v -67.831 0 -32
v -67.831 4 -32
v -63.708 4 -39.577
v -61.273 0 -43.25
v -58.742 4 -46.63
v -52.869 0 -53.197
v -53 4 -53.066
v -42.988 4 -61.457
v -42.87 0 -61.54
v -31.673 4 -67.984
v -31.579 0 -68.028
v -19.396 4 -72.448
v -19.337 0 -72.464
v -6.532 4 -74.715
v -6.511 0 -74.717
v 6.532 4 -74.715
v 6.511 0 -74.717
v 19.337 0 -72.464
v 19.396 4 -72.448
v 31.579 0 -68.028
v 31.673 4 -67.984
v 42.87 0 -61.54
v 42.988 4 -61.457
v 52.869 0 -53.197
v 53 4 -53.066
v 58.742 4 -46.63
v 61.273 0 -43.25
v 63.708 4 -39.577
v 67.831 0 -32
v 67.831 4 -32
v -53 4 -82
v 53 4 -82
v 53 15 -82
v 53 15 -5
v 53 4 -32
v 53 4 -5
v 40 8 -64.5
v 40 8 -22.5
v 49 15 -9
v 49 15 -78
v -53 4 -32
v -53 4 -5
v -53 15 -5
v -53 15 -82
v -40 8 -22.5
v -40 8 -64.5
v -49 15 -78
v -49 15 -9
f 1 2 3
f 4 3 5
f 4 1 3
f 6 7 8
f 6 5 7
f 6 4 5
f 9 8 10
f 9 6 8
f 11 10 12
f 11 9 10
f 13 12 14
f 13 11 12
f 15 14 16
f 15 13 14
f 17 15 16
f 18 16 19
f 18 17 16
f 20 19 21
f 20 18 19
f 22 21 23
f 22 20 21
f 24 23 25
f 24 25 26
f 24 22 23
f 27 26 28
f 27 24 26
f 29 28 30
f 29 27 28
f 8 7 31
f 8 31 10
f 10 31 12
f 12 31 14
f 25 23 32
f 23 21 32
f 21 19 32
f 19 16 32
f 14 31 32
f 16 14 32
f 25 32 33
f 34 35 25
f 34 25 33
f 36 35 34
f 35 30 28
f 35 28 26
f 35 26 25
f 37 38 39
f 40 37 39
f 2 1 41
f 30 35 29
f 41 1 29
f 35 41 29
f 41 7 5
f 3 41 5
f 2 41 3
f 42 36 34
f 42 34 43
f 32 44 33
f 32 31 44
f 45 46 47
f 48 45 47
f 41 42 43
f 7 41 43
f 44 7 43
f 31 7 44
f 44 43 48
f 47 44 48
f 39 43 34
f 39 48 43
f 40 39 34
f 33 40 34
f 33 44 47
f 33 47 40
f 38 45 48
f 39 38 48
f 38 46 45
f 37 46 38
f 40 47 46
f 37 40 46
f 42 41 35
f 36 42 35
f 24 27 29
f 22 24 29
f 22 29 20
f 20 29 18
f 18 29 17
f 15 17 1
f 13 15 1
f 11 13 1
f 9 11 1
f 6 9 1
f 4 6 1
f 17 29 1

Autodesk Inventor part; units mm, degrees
ref_plane "YZ Plane" through (0, 0, 0) normal (1, 0, 0) x (0, 1, 0)
ref_plane "XZ Plane" through (0, 0, 0) normal (0, 1, 0) x (-1, 0, 0)
ref_plane "XY Plane" through (0, 0, 0) normal (0, 0, 1) x (1, 0, 0)
sketch "Boceto1" plane through (0, 0, 0) normal (0, 1, 0) x (-1, 0, 0)
  arc A0 (-67.8307, -32) -> (67.8307, -32) centre (0, 0) ccw
  line L0 (0, -32) -> (-67.8307, -32)
  line L1 (0, -32) -> (67.8307, -32)
  dimension "d0" = 150
extrude "Extrusión1" add sketch "Boceto1" along normal blind 4
sketch "Boceto2" plane through (0, 4, 0) normal (0, 1, 0) x (1, 0, 0)
  line L0 (-67.8307, 32) -> (67.8307, 32) projected
  line L1 (0, 32) -> (0, 5)
  line L2 (0, 5) -> (-53, 5)
  line L3 (-53, 5) -> (-53, 82)
  line L4 (-53, 82) -> (53, 82)
  line L5 (53, 82) -> (53, 5)
  line L6 (53, 5) -> (0, 5)
  point P0 (0, 0)
  dimension "d4" = 27
  dimension "d5" = 53
  dimension "d6" = 77
  dimension "d7" = 106
extrude "Extrusión2" add sketch "Boceto2" along normal blind 11
sketch "Boceto3" plane through (0, 15, 0) normal (0, 1, 0) x (1, 0, 0)
  line L0 (53, 5) -> (53, 82) projected
  line L1 (53, 43.5) -> (53, 64.5)
  line L2 (40, 64.5) -> (-40, 64.5)
  line L3 (-53, 82) -> (-53, 5) projected
  line L4 (53, 82) -> (-53, 82) projected
  line L5 (0, 82) -> (40, 82)
  line L6 (40, 64.5) -> (40, 22.5)
  line L7 (-53, 5) -> (53, 5) projected
  line L8 (0, 82) -> (-40, 82)
  line L9 (-40, 64.5) -> (-40, 22.5)
  line L10 (53, 43.5) -> (53, 22.5)
  line L11 (40, 22.5) -> (-40, 22.5)
  point P0 (0, 0)
  dimension "d10" = 21
  dimension "d11" = 40
  dimension "d12" = 40
  dimension "d13" = 21
extrude "Extrusión3" cut sketch "Boceto3" against normal blind 7 contours L6 L11 L9 L2
sketch "Boceto4" plane through (40, 15, -22.5) normal (0, 0, -1) x (-1, 0, 0)
  line L0 (80, 0) -> (80, -7) projected
  line L1 (0, 0) -> (0, -7) projected
  line L2 (80, -7) -> (0, -7)
  line L3 (-13, 0) -> (-9, 0)
  line L4 (-9, 0) -> (0, 0)
  line L5 (0, 0) -> (0, -7)
  line L6 (0, -7) -> (-9, 0)
  line L7 (93, 0) -> (89, 0)
  line L8 (89, 0) -> (80, 0)
  line L9 (80, -7) -> (89, 0)
  point P0 (40, -15)
  dimension "d16" = 4
  dimension "d17" = 4
extrude "Extrusión4" cut sketch "Boceto4" along normal blind 55.5 and the other way blind 13.5
sketch "Boceto5" plane through (40, 8, -64.5) normal (1, 0, 0) x (0, 0, -1)
  line L0 (0, 7) -> (0, 0) projected
  line L1 (0, 0) -> (0, 7)
  line L2 (13.5, 7) -> (13.5, 0) projected
  line L3 (0, 7) -> (13.5, 7)
  line L4 (0, 0) -> (13.5, 0) projected
  line L5 (13.5, 7) -> (0, 0)
  line L6 (0, 0) -> (0, 7)
  line L7 (-42, 0) -> (0, 0) projected
  line L8 (-42, 7) -> (-42, 0) projected
  line L9 (-42, 0) -> (-42, 7)
  line L10 (-55.5, 7) -> (-55.5, 0) projected
  line L11 (-42, 7) -> (-55.5, 7)
  line L12 (-55.5, 0) -> (-42, 0) projected
  line L13 (-55.5, 7) -> (-42, 0)
  point P0 (-64.5, -8)
extrude "Extrusión5" cut sketch "Boceto5" against normal blind 80 contours L3 L5 L0 | L13 L11 L8
sketch "Boceto6" plane through (40, 8, -78) normal (1, 0, 0) x (0, 0, -1)
  line L0 (-69, 0) -> (-69, 7) projected
  line L1 (-69, 0) -> (-55.5, 0) projected
  line L2 (-69, 7) -> (-69, 0)
  line L3 (-69, 0) -> (-55.5, 0)
  line L4 (-69, 7) -> (0, 7) projected
  line L5 (-55.5, 0) -> (-69, 7)
  line L6 (0, 7) -> (0, 0) projected
  line L7 (0, 7) -> (0, 0)
  line L8 (-13.5, 0) -> (0, 7) projected
  line L9 (0, 0) -> (-13.5, 0)
  line L10 (0, 7) -> (-13.5, 0)
  point P0 (-78, -8)
extrude "Extrusión6" add sketch "Boceto6" along normal blind 10 and the other way blind 90
properties part number "Soporte_caja"
